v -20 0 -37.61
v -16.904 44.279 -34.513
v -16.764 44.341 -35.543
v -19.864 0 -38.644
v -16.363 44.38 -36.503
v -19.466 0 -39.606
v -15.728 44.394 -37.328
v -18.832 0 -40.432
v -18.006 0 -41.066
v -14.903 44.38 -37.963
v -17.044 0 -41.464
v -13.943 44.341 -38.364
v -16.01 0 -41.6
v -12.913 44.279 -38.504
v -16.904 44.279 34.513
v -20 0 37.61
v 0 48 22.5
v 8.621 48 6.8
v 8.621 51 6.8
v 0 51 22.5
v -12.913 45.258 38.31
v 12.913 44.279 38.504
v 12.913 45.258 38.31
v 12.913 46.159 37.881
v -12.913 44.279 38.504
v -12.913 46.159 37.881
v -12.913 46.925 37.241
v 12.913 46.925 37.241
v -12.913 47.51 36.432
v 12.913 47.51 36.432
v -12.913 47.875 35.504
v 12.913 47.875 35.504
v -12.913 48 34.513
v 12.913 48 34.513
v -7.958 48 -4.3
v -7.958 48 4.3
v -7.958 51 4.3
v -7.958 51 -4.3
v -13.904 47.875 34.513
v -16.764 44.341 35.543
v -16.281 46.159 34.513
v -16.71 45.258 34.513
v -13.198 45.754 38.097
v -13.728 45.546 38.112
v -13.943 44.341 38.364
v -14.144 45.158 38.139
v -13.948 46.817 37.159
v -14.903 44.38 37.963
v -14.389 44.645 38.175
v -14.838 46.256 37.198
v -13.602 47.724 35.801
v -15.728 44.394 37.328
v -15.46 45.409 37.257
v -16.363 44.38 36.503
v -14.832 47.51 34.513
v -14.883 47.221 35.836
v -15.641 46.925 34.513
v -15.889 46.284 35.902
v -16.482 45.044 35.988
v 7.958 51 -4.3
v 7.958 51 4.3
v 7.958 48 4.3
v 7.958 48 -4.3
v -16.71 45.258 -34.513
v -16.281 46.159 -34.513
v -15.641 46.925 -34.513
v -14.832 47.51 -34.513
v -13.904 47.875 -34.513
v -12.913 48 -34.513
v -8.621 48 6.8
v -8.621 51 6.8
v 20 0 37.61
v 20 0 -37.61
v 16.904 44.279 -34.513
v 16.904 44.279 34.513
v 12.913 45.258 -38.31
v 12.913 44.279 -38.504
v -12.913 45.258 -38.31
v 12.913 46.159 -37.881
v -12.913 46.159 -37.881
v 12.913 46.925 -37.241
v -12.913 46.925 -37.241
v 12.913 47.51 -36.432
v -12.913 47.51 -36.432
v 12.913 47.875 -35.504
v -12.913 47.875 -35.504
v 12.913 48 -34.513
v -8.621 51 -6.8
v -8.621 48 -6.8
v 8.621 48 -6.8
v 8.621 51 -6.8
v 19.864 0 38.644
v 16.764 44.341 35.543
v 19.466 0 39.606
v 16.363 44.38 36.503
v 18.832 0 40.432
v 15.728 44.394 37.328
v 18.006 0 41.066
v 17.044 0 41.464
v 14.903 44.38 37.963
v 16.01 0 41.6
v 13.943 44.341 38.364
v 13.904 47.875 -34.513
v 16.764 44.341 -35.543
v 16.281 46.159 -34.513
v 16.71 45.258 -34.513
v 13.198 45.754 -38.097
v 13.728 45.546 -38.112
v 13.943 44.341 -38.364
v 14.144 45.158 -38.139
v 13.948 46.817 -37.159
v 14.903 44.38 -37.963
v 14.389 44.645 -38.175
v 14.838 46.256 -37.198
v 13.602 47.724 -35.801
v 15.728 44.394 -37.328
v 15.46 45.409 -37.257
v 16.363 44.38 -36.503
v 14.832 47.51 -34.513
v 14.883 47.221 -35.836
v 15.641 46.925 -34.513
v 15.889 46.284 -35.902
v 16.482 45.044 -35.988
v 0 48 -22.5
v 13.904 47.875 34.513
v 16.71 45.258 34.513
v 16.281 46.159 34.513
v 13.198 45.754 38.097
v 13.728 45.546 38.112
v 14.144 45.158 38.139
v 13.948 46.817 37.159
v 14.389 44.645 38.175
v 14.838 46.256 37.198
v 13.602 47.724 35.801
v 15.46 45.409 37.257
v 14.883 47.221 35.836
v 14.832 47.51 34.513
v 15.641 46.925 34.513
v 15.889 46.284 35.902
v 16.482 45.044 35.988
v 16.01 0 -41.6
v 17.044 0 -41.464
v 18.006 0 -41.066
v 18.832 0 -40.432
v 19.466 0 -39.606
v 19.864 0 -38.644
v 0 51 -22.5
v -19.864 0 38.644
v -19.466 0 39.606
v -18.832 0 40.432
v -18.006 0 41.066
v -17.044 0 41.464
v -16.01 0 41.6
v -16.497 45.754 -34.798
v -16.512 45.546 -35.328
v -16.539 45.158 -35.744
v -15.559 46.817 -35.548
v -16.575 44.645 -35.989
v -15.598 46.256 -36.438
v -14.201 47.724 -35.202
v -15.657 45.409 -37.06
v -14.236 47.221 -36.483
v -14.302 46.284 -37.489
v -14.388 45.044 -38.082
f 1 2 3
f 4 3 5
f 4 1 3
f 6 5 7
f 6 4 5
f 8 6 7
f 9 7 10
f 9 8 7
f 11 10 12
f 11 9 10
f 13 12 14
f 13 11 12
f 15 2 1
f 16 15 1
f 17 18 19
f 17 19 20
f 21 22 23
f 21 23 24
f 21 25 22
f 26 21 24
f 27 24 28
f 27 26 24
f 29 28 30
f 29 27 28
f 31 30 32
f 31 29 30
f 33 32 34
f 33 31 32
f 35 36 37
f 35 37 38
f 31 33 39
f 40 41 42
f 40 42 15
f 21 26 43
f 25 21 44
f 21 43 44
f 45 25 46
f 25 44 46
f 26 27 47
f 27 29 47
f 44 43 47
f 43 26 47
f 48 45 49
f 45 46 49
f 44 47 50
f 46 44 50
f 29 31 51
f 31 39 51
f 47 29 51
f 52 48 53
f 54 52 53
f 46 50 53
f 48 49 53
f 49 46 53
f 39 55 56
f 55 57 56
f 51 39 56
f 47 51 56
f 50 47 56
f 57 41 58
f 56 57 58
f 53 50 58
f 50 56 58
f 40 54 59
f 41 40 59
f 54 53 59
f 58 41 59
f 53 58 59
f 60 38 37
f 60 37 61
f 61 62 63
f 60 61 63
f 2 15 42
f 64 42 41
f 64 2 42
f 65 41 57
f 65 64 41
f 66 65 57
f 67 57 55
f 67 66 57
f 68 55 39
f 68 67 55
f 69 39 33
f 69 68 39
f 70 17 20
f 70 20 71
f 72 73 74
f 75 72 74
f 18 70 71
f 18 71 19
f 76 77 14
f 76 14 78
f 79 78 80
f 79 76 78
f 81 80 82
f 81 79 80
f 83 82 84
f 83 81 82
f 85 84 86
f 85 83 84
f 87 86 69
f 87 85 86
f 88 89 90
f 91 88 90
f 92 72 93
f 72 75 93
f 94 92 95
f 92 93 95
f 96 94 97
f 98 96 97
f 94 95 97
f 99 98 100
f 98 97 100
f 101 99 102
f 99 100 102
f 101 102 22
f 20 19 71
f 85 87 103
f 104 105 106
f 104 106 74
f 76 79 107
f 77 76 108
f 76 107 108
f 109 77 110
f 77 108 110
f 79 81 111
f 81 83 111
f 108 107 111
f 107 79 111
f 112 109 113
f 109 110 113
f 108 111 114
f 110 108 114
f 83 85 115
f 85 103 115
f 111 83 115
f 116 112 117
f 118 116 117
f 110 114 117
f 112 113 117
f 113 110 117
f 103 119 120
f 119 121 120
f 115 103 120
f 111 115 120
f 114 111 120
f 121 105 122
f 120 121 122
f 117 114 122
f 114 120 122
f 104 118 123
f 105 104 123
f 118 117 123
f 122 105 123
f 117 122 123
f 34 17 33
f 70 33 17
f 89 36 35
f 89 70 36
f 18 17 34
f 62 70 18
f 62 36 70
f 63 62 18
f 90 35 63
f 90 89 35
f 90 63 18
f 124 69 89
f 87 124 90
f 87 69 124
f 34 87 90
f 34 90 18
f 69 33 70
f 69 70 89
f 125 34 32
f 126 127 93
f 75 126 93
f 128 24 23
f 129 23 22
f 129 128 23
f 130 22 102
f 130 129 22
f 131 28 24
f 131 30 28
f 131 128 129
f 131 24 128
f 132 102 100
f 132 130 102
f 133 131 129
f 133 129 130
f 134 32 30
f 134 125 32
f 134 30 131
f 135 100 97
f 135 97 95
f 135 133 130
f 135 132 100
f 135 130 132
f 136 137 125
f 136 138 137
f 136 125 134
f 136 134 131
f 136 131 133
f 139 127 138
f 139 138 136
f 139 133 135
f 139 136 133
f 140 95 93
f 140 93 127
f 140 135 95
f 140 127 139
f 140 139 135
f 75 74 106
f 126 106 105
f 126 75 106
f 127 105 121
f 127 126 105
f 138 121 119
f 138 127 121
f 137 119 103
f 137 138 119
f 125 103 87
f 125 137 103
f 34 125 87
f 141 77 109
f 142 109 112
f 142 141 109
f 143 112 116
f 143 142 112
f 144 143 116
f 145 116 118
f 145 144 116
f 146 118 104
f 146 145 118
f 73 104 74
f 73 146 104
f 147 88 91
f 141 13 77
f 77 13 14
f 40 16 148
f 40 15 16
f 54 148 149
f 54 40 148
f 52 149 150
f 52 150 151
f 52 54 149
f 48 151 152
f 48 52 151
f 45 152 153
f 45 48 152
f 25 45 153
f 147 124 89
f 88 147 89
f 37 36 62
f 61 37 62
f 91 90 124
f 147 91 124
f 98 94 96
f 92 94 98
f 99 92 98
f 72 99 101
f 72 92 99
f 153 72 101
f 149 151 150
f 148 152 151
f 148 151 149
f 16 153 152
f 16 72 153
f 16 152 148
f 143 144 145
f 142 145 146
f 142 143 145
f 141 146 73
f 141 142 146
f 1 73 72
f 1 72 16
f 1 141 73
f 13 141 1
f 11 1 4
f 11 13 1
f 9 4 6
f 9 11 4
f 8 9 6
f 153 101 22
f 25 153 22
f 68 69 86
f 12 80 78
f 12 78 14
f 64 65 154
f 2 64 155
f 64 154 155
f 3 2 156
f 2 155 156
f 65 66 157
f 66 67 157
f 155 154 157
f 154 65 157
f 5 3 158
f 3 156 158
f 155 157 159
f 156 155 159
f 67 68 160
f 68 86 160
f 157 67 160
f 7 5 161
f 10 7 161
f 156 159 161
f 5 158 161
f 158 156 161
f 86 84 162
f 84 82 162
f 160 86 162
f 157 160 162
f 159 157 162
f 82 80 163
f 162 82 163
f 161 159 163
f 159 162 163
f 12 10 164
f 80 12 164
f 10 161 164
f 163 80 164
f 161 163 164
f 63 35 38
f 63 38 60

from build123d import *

# Parameters (mm, degrees)
SKETCH1_W           = 40
SKETCH1_H           = 83.2
SKETCH1_W_2         = 15.916627574
SKETCH1_H_2         = 8.6
BOSS_EXTRUDE1_DEPTH = 48
CHAMFER1_SIZE       = 48
CHAMFER1_SIZE_2     = 3.356486973
BOSS_EXTRUDE2_START = 48
SKETCH1_3_W         = 15.916627574
SKETCH1_3_H         = 8.6
BOSS_EXTRUDE2_DEPTH = 3
FILLET1_R           = 4


with BuildPart() as part:
    # Sketch1 → Boss-Extrude1 (new body)
    # profile 1 of 4: a face of its own
    with BuildSketch(Plane(origin=(0, 0, 0), x_dir=(1, 0, 0), z_dir=(0, 1, 0))):
        Rectangle(SKETCH1_W, SKETCH1_H)
        Polygon((8.620526076, 6.8), (0, 22.5), (-8.620526076, 6.8), align=None, mode=Mode.SUBTRACT)
        Rectangle(SKETCH1_W_2, SKETCH1_H_2, mode=Mode.SUBTRACT)
        Polygon((-8.620526076, -6.8), (0, -22.5), (8.620526076, -6.8), align=None, mode=Mode.SUBTRACT)
    # profile 2 of 4: a face of its own
    with BuildSketch(Plane(origin=(0, 0, 0), x_dir=(1, 0, 0), z_dir=(0, 1, 0))):
        Polygon((-8.620526076, 6.8), (8.620526076, 6.8), (0, 22.5), align=None)
    # profile 3 of 4: a face of its own
    with BuildSketch(Plane(origin=(0, 0, 0), x_dir=(1, 0, 0), z_dir=(0, 1, 0))):
        Rectangle(SKETCH1_W_2, SKETCH1_H_2)
    # profile 4 of 4: a face of its own
    with BuildSketch(Plane(origin=(0, 0, 0), x_dir=(1, 0, 0), z_dir=(0, 1, 0))):
        Polygon((-8.620526076, -6.8), (8.620526076, -6.8), (0, -22.5), align=None)
    extrude(amount=BOSS_EXTRUDE1_DEPTH)

    # Chamfer1
    # the kernel refuses this chamfer: 48, 3.356486973 mm, written as the material it takes off along each edge
    with BuildSketch(Plane(origin=(144.788756649, 48, 41.6), x_dir=(0, -0.999996400257939, 0.002683183028377395), z_dir=(-1, 0, 0)), Plane(origin=(-144.788756649, 48, -41.6), x_dir=(0, -0.999996400257939, -0.002683183028377395), z_dir=(1, 0, 0))) as chamfer1_piece_1:
        Polygon((CHAMFER1_SIZE * 0.999996400258, -CHAMFER1_SIZE * 0.00268318302838), (-CHAMFER1_SIZE_2 * 0.00268318302861, -CHAMFER1_SIZE_2 * 0.999996400344), (0, 0), align=None)
    extrude(amount=289.577513297, mode=Mode.SUBTRACT)
    with BuildSketch(Plane(origin=(-20, 48, 166.388756649), x_dir=(0.8766829747338886, 0.4810685624853697, 0), z_dir=(0, 0, -1))) as chamfer1_piece_2:
        Polygon((CHAMFER1_SIZE_2 * 0.876682974809, CHAMFER1_SIZE_2 * 0.481068562527), (-CHAMFER1_SIZE * 0.481068562485, CHAMFER1_SIZE * 0.876682974734), (0, 0), align=None)
    extrude(amount=332.777513297, mode=Mode.SUBTRACT)
    with BuildSketch(Plane(origin=(20, 48, -166.388756649), x_dir=(0.002683183028377466, -0.999996400257939, 0), z_dir=(0, 0, 1))) as chamfer1_piece_3:
        Polygon((CHAMFER1_SIZE * 0.999996400258, -CHAMFER1_SIZE * 0.00268318302838), (-CHAMFER1_SIZE_2 * 0.00268318302861, -CHAMFER1_SIZE_2 * 0.999996400344), (0, 0), align=None)
    extrude(amount=332.777513297, mode=Mode.SUBTRACT)

    # Sketch1<3> → Boss-Extrude2 (add)
    with BuildSketch(Plane(origin=(0, 0, 0), x_dir=(1, 0, 0), z_dir=(0, 1, 0)).offset(BOSS_EXTRUDE2_START)):
        Polygon((-8.620526076, 6.8), (8.620526076, 6.8), (0, 22.5), align=None)
        Rectangle(SKETCH1_3_W, SKETCH1_3_H)
        Polygon((-8.620526076, -6.8), (8.620526076, -6.8), (0, -22.5), align=None)
    extrude(amount=BOSS_EXTRUDE2_DEPTH)

    # Fillet1
    fillet1_edges = [part.edges().sort_by_distance(p)[0] for p in [
        (16.643513027, 48, 0),
        (0, 48, -38.243513027),
        (-16.643513027, 48, 0),
        (0, 48, 38.243513027),
        (-18.321756513, 24, -39.921756513),
        (18.321756513, 24, -39.921756513),
        (-18.321756513, 24, 39.921756513),
        (18.321756513, 24, 39.921756513),
    ]]
    fillet(fillet1_edges, radius=FILLET1_R)


solid = part.part
